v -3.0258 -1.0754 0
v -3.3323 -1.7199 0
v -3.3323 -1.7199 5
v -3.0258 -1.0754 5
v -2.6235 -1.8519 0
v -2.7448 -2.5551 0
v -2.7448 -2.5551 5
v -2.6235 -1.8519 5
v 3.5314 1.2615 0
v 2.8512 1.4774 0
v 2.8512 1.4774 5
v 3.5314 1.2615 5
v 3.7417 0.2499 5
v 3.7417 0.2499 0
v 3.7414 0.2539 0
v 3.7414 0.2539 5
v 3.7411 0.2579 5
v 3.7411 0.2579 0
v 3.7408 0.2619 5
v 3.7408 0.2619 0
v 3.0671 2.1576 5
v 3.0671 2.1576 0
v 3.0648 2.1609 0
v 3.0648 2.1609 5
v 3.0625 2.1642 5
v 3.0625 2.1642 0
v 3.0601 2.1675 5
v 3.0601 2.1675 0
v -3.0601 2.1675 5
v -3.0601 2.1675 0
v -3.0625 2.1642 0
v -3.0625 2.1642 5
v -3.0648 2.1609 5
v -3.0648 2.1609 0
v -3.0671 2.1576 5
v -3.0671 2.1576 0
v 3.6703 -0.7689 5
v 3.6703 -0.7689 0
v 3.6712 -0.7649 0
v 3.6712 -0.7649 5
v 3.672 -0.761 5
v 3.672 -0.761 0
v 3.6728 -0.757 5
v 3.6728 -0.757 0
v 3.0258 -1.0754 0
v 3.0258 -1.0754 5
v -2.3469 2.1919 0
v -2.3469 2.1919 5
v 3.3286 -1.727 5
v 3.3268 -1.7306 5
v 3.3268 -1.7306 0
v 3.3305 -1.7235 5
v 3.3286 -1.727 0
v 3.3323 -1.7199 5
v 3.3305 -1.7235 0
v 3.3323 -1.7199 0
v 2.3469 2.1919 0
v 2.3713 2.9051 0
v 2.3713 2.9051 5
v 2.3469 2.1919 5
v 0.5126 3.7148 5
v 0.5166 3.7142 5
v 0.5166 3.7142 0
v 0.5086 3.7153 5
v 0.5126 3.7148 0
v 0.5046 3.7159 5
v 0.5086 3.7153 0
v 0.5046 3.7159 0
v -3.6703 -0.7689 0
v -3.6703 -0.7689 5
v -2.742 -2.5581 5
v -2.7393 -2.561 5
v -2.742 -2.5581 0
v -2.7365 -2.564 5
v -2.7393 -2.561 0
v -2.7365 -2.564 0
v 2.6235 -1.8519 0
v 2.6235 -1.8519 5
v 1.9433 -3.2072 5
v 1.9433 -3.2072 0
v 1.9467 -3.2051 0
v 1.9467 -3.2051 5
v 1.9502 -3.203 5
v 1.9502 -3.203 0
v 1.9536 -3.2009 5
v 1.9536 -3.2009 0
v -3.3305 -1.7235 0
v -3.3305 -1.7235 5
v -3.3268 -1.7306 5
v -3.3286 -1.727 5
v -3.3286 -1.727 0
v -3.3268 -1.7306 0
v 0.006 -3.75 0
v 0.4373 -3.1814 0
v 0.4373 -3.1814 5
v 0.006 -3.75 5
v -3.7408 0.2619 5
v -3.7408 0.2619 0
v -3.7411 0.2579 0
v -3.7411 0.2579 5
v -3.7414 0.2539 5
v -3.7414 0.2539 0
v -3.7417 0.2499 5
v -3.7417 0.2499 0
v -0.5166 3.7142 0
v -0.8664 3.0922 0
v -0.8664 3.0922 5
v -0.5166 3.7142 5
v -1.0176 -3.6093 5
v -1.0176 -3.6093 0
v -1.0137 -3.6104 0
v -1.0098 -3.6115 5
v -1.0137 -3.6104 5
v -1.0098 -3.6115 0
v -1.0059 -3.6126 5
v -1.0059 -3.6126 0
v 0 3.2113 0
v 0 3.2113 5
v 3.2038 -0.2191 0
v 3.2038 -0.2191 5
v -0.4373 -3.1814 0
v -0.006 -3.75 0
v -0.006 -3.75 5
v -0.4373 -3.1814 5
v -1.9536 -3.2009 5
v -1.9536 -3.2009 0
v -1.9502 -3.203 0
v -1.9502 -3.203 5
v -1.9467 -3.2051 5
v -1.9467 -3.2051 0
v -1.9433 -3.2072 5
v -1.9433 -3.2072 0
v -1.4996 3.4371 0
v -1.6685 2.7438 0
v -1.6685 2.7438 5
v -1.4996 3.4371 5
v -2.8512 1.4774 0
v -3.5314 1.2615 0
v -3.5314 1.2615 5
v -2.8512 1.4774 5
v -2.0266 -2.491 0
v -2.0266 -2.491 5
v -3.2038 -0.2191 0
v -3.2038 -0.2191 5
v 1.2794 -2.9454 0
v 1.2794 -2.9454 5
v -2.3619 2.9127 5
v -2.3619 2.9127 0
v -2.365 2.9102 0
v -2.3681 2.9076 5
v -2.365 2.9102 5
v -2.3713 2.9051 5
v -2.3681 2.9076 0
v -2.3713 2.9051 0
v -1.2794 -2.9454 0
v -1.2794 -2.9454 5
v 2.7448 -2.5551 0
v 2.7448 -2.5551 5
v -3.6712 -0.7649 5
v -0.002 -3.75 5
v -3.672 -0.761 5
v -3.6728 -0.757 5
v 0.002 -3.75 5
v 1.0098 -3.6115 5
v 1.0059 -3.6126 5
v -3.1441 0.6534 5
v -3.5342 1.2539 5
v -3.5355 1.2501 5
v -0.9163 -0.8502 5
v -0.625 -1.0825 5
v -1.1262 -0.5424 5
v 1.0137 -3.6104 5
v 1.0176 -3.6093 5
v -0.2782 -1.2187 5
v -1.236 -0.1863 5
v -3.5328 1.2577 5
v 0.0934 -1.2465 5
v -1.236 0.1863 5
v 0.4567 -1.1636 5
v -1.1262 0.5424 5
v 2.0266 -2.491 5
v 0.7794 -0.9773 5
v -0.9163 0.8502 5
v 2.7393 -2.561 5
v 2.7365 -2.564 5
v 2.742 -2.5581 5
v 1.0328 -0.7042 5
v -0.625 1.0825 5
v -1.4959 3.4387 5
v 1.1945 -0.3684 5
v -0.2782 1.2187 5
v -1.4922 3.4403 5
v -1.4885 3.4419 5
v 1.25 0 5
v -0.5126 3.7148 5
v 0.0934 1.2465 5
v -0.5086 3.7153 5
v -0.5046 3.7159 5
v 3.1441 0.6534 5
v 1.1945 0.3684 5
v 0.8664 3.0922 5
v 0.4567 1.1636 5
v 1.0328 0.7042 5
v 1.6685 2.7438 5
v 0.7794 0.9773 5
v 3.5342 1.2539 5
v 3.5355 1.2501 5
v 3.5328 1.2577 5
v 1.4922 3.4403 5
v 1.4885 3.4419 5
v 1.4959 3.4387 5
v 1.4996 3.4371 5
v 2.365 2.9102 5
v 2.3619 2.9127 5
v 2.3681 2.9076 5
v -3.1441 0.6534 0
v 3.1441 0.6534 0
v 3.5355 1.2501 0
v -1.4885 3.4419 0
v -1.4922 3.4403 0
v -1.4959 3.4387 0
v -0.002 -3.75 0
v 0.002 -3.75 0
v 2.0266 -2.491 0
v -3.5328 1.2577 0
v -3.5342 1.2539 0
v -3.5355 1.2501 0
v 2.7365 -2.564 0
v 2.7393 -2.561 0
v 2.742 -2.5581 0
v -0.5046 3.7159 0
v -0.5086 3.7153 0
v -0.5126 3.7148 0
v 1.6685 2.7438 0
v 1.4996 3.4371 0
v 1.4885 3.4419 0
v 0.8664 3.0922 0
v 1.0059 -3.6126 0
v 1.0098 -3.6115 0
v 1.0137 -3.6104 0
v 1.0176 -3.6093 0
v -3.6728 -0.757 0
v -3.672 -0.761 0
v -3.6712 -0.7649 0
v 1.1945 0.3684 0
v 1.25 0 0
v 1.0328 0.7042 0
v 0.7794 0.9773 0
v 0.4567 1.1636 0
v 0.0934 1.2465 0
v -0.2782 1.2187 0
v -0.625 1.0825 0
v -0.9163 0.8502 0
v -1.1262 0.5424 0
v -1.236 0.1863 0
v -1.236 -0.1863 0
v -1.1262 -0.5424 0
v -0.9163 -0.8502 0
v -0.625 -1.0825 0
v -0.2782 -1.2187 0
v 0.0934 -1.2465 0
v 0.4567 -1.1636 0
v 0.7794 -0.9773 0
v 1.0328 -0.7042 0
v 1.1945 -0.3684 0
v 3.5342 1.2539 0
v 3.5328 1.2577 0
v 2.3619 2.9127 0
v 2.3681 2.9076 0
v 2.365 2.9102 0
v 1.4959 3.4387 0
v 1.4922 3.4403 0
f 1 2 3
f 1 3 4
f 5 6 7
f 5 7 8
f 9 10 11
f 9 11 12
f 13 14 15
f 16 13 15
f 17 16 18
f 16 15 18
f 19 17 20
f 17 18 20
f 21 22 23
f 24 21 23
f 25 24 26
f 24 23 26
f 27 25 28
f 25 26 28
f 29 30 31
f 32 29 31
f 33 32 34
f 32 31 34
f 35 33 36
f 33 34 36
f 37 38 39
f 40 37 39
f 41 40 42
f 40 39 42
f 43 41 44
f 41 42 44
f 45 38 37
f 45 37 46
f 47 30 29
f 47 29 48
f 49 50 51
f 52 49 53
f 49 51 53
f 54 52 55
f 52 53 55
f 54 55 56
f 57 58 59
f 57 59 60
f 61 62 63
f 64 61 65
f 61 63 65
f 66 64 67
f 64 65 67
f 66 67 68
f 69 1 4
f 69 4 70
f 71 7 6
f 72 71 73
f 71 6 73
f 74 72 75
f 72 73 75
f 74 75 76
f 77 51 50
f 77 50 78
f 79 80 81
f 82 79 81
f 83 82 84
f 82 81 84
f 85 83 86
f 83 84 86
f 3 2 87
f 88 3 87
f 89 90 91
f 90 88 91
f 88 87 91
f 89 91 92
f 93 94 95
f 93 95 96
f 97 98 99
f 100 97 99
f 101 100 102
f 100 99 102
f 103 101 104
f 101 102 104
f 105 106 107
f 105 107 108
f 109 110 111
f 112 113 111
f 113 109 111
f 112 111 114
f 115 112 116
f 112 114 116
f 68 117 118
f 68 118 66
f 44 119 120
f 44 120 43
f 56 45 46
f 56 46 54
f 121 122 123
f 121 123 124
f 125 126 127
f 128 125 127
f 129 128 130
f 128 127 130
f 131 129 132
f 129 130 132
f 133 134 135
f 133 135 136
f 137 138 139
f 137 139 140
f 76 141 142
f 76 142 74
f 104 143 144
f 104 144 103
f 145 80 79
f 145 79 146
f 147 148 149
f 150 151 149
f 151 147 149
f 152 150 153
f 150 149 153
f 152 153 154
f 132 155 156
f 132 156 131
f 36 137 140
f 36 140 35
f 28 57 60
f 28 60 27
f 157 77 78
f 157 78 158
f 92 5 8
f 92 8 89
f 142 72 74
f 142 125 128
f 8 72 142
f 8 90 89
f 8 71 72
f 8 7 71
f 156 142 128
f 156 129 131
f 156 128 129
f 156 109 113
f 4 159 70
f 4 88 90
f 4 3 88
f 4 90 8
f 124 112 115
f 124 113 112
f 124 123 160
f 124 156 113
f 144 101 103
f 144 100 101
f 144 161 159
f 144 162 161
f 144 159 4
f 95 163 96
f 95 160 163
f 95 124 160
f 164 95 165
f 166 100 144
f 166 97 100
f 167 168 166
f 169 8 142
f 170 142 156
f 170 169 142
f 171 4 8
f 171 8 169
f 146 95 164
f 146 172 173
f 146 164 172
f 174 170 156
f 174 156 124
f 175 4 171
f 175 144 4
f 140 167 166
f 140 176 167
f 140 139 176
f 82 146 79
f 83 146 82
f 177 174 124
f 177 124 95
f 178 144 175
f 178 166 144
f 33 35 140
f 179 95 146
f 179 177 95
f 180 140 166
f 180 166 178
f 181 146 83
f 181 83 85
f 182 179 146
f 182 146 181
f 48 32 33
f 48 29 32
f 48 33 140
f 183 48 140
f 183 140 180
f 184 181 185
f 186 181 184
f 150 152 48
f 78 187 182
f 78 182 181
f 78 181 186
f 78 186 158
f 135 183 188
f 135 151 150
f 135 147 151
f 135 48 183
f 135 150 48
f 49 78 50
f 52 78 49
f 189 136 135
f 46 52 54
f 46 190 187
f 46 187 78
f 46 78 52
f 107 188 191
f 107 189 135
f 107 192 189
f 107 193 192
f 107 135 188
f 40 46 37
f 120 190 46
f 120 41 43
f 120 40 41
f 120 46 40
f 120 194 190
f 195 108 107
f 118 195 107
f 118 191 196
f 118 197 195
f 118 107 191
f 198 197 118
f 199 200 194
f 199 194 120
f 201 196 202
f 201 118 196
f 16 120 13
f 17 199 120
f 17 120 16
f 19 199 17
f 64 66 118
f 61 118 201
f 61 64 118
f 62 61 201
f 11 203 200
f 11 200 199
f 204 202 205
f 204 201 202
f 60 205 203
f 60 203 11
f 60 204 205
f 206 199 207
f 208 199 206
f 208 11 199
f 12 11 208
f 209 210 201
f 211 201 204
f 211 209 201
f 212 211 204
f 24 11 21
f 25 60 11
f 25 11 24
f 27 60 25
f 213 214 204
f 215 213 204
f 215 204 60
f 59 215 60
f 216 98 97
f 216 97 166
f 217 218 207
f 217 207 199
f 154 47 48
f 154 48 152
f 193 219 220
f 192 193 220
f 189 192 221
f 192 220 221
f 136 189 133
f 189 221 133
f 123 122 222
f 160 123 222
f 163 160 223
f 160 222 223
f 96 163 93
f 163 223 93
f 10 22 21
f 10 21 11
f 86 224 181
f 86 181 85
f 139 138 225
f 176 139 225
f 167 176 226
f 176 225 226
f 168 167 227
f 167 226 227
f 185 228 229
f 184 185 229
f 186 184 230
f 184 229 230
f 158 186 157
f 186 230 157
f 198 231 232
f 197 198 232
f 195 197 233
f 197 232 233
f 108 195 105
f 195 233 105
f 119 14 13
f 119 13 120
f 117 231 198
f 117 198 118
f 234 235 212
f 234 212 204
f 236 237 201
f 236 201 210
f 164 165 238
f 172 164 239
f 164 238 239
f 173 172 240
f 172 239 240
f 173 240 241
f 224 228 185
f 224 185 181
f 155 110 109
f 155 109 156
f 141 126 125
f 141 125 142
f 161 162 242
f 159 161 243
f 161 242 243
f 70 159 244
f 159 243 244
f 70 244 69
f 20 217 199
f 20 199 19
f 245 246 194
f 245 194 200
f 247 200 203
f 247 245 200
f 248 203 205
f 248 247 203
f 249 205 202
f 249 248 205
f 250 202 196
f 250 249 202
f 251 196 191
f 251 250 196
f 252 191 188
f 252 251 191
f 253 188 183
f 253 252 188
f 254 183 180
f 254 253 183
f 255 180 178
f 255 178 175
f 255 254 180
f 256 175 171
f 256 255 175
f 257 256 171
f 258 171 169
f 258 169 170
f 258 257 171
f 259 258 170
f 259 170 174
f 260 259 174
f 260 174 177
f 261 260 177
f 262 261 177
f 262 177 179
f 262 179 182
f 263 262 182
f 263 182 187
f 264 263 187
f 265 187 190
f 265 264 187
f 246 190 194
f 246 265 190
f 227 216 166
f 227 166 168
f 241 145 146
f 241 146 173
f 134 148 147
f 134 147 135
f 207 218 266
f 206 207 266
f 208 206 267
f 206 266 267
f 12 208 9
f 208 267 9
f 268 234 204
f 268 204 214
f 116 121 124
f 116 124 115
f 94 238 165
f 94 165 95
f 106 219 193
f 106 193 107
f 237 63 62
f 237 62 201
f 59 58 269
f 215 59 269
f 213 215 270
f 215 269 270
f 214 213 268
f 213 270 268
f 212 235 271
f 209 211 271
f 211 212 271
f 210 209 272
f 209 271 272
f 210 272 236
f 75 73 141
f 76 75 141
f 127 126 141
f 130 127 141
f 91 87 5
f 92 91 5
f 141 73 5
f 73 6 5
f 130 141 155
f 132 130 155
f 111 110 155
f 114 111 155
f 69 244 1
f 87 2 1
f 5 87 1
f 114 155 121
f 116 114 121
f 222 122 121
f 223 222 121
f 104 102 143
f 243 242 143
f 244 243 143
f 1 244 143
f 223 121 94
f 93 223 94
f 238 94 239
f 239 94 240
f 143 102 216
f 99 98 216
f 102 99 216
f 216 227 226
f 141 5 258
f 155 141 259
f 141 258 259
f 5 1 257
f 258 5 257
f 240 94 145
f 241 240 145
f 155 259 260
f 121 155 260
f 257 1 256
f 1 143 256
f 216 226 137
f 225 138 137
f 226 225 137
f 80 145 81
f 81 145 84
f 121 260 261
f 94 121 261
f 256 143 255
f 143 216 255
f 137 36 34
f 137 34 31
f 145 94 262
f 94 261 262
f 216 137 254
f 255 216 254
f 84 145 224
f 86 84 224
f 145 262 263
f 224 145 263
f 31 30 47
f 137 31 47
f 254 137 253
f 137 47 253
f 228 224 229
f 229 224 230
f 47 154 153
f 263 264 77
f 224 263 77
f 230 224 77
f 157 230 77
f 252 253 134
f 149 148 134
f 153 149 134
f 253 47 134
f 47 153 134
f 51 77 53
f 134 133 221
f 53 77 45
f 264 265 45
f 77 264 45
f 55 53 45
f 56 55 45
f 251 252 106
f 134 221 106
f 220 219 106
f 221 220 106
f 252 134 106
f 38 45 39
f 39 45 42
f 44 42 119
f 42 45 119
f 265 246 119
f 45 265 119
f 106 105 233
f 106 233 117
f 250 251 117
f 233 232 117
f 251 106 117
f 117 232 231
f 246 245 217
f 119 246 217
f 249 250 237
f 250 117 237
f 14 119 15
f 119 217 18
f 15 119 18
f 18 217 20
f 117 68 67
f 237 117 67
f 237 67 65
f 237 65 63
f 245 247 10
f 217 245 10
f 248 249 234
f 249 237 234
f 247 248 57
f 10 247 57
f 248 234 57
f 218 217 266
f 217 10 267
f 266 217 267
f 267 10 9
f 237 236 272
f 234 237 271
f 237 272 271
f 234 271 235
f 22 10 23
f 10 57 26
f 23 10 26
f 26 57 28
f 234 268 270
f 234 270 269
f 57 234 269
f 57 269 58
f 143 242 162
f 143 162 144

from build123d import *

# Parameters (mm, degrees)
SKETCH1_R           = 3.75
SKETCH1_R_2         = 1.25
BOSS_EXTRUDE1_DEPTH = 5
CUT_EXTRUDE1_DEPTH  = 8.288689869
CIRPATTERN1_COUNT   = 23


with BuildPart() as part:
    # Sketch1 → Boss-Extrude1 (new body)
    with BuildSketch(Plane.XY):
        Circle(SKETCH1_R)
        Circle(SKETCH1_R_2, mode=Mode.SUBTRACT)
    extrude(amount=BOSS_EXTRUDE1_DEPTH)

    # Sketch2 → Cut-Extrude1 (cut, through all)
    with BuildSketch(Plane.XY):
        Polygon((0, 3.211260138), (1.027348171, 4.238608309), (-1.027348171, 4.238608309), align=None)
    cut_extrude1 = extrude(amount=CUT_EXTRUDE1_DEPTH, mode=Mode.SUBTRACT)

    # CirPattern1: Cut-Extrude1 ×23 about axis
    cirpattern1_axis = Axis((0, 0, 0), (0, 0, 1))
    for i in range(1, CIRPATTERN1_COUNT):
        add(cut_extrude1.rotate(cirpattern1_axis, i * 360 / CIRPATTERN1_COUNT), mode=Mode.SUBTRACT)


solid = part.part
